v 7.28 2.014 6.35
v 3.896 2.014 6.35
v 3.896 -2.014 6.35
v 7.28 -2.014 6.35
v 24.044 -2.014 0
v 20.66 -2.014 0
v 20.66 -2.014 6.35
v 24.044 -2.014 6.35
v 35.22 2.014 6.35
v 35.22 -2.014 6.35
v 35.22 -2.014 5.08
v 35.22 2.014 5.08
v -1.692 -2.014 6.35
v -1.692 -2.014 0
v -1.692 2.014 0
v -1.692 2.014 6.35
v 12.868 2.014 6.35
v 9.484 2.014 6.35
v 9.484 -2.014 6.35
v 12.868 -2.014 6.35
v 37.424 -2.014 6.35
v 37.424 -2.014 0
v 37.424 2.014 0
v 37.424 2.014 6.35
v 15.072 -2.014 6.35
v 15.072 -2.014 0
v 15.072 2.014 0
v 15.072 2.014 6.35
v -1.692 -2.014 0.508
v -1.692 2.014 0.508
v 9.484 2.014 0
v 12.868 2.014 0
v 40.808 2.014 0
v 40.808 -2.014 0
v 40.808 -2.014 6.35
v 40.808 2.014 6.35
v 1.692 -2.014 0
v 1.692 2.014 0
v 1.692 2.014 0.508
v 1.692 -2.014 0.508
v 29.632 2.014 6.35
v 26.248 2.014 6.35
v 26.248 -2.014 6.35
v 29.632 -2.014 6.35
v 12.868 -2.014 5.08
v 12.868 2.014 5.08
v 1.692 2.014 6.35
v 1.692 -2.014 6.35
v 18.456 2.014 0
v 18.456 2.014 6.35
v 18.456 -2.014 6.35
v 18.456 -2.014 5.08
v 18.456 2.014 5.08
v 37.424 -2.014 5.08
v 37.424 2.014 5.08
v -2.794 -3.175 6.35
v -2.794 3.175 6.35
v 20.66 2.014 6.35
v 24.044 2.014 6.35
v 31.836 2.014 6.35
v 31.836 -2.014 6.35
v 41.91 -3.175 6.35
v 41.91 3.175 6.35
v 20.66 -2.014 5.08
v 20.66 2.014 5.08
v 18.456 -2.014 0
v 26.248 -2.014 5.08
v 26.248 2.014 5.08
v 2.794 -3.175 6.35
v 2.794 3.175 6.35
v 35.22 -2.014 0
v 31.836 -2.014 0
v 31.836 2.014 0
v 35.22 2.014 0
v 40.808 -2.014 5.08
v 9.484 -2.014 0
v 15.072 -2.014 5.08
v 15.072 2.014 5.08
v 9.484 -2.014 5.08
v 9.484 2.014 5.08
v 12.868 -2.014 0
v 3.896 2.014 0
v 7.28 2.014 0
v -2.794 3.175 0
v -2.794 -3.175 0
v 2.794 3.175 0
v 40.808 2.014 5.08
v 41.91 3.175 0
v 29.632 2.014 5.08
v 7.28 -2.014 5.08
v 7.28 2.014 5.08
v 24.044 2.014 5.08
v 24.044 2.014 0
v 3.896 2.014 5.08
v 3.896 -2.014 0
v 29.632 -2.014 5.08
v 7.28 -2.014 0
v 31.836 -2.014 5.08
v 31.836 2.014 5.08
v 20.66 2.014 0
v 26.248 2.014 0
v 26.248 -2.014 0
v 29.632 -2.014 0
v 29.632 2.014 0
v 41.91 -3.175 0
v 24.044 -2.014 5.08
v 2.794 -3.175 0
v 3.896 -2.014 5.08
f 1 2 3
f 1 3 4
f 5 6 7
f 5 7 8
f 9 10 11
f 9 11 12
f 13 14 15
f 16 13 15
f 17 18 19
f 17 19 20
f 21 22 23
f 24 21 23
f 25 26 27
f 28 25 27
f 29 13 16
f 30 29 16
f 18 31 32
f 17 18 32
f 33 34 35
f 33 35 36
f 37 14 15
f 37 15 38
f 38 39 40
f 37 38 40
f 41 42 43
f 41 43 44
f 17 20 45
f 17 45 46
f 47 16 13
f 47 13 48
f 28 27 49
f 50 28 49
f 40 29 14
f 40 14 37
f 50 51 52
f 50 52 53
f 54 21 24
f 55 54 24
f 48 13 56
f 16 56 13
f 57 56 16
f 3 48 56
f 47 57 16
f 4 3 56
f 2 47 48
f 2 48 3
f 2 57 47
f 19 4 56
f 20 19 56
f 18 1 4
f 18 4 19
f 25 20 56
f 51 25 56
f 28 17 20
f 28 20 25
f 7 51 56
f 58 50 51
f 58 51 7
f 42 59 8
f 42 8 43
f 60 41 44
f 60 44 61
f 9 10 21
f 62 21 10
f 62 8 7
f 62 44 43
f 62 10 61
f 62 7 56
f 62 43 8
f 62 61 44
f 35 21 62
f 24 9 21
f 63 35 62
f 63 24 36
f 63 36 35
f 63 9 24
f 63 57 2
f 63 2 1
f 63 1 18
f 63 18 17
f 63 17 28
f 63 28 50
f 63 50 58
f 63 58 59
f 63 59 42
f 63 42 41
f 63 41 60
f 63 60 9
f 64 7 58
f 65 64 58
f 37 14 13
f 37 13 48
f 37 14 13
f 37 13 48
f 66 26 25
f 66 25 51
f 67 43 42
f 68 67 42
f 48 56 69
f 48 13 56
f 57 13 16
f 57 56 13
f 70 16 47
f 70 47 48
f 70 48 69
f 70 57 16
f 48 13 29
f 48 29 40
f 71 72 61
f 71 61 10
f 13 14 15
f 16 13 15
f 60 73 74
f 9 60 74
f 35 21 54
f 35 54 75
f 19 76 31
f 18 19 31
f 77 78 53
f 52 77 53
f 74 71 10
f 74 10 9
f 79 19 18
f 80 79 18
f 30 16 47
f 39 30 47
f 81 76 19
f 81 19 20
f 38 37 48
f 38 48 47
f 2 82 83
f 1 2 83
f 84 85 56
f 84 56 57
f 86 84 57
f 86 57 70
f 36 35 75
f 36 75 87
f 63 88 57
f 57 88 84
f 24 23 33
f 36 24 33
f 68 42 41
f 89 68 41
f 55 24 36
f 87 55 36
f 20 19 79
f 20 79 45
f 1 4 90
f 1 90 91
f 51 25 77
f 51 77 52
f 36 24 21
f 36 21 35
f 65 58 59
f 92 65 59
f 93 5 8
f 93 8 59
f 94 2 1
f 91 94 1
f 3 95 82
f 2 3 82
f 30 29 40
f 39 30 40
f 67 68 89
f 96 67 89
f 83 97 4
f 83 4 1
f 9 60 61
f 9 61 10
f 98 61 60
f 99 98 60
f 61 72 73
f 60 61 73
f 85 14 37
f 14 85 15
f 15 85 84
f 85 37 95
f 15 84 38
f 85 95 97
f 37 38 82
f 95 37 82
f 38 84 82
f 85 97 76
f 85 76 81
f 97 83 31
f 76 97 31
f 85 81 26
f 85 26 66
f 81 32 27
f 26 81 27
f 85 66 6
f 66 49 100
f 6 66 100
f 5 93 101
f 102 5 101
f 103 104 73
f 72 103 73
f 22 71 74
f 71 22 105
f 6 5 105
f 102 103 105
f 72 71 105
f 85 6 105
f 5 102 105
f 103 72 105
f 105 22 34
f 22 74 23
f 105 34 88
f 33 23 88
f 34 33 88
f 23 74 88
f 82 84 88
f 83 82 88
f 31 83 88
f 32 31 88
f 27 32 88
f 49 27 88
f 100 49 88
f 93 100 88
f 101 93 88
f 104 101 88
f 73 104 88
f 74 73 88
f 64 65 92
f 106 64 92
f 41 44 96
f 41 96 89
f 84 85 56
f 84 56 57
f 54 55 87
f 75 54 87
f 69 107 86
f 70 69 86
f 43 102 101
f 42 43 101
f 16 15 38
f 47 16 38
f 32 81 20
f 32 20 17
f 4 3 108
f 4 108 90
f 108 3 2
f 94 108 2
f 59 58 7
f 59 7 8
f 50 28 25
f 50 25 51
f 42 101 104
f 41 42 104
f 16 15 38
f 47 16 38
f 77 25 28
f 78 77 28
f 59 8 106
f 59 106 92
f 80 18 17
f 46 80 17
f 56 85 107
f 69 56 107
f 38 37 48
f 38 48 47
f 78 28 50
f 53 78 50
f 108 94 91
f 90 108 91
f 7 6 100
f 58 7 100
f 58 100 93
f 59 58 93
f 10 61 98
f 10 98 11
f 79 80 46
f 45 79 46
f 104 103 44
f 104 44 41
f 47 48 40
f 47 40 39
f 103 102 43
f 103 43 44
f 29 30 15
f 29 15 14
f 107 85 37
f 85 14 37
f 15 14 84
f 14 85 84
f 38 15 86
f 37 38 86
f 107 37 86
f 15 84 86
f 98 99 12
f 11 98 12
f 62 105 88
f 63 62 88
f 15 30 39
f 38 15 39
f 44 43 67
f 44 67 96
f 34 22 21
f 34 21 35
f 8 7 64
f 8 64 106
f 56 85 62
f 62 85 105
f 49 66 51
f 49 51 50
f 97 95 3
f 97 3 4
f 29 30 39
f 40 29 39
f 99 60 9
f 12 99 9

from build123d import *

# Parameters (mm, degrees)
F0_W      = 5.588
F0_H      = 6.35
F0_W_2    = 3.384714
F0_H_2    = 4.02789
F1_DEPTH  = 6.35
F2_W      = 3.384714
F2_H      = 4.02789
F3_DEPTH  = 5.842
F3_FACE_W = 3.384714
F3_FACE_H = 4.02789
F4_DEPTH  = 0.508
F5_DEPTH  = 6.35
F6_W      = 3.384714
F6_H      = 4.02789
F7_DEPTH  = 1.27


with BuildPart() as f1:
    # F0 (on Top) → F1 (new body)
    with BuildSketch(Plane.XY):
        Rectangle(F0_W, F0_H)
        Rectangle(F0_W_2, F0_H_2, mode=Mode.SUBTRACT)
    extrude(amount=F1_DEPTH)


with BuildPart() as f3:
    # F2 (on face) → F3 (new body)
    with BuildSketch(Plane.XY.offset(6.35)):
        Rectangle(F2_W, F2_H)
    extrude(amount=-F3_DEPTH)


with BuildPart() as f4:
    # F3_face (on face) → F4 (new body)
    with BuildSketch(Plane(origin=(0, 0, 0.508), x_dir=(1, 0, 0), z_dir=(0, 0, -1))):
        Rectangle(F3_FACE_W, F3_FACE_H)
    extrude(amount=F4_DEPTH)


with BuildPart() as f5:
    # F0 (on Top) → F5 (new body)
    with BuildSketch(Plane.XY):
        Rectangle(F0_W, F0_H)
        Rectangle(F0_W_2, F0_H_2, mode=Mode.SUBTRACT)
        with Locations((5.588, 0)):
            Rectangle(F0_W, F0_H)
        with Locations((5.588, 0)):
            Rectangle(F0_W_2, F0_H_2, mode=Mode.SUBTRACT)
        with Locations((11.176, 0)):
            Rectangle(F0_W, F0_H)
        with Locations((11.176, 0)):
            Rectangle(F0_W_2, F0_H_2, mode=Mode.SUBTRACT)
        with Locations((16.764, 0)):
            Rectangle(F0_W, F0_H)
        with Locations((16.764, 0)):
            Rectangle(F0_W_2, F0_H_2, mode=Mode.SUBTRACT)
        with Locations((22.352, 0)):
            Rectangle(F0_W, F0_H)
        with Locations((22.352, 0)):
            Rectangle(F0_W_2, F0_H_2, mode=Mode.SUBTRACT)
        with Locations((27.94, 0)):
            Rectangle(F0_W, F0_H)
        with Locations((27.94, 0)):
            Rectangle(F0_W_2, F0_H_2, mode=Mode.SUBTRACT)
        with Locations((33.528, 0)):
            Rectangle(F0_W, F0_H)
        with Locations((33.528, 0)):
            Rectangle(F0_W_2, F0_H_2, mode=Mode.SUBTRACT)
        with Locations((39.116, 0)):
            Rectangle(F0_W, F0_H)
        with Locations((39.116, 0)):
            Rectangle(F0_W_2, F0_H_2, mode=Mode.SUBTRACT)
    extrude(amount=F5_DEPTH)


with BuildPart() as f7:
    # F6 (on face) → F7 (new body)
    with BuildSketch(Plane.XY.offset(6.35)):
        with Locations((5.588, 0)):
            Rectangle(F6_W, F6_H)
        with Locations((11.176, 0)):
            Rectangle(F6_W, F6_H)
        with Locations((16.764, 0)):
            Rectangle(F6_W, F6_H)
        with Locations((22.352, 0)):
            Rectangle(F6_W, F6_H)
        with Locations((27.94, 0)):
            Rectangle(F6_W, F6_H)
        with Locations((33.528, 0)):
            Rectangle(F6_W, F6_H)
        with Locations((39.116, 0)):
            Rectangle(F6_W, F6_H)
    extrude(amount=-F7_DEPTH)


solid = Compound([f1.part, f3.part, f4.part, f5.part, f7.part])
